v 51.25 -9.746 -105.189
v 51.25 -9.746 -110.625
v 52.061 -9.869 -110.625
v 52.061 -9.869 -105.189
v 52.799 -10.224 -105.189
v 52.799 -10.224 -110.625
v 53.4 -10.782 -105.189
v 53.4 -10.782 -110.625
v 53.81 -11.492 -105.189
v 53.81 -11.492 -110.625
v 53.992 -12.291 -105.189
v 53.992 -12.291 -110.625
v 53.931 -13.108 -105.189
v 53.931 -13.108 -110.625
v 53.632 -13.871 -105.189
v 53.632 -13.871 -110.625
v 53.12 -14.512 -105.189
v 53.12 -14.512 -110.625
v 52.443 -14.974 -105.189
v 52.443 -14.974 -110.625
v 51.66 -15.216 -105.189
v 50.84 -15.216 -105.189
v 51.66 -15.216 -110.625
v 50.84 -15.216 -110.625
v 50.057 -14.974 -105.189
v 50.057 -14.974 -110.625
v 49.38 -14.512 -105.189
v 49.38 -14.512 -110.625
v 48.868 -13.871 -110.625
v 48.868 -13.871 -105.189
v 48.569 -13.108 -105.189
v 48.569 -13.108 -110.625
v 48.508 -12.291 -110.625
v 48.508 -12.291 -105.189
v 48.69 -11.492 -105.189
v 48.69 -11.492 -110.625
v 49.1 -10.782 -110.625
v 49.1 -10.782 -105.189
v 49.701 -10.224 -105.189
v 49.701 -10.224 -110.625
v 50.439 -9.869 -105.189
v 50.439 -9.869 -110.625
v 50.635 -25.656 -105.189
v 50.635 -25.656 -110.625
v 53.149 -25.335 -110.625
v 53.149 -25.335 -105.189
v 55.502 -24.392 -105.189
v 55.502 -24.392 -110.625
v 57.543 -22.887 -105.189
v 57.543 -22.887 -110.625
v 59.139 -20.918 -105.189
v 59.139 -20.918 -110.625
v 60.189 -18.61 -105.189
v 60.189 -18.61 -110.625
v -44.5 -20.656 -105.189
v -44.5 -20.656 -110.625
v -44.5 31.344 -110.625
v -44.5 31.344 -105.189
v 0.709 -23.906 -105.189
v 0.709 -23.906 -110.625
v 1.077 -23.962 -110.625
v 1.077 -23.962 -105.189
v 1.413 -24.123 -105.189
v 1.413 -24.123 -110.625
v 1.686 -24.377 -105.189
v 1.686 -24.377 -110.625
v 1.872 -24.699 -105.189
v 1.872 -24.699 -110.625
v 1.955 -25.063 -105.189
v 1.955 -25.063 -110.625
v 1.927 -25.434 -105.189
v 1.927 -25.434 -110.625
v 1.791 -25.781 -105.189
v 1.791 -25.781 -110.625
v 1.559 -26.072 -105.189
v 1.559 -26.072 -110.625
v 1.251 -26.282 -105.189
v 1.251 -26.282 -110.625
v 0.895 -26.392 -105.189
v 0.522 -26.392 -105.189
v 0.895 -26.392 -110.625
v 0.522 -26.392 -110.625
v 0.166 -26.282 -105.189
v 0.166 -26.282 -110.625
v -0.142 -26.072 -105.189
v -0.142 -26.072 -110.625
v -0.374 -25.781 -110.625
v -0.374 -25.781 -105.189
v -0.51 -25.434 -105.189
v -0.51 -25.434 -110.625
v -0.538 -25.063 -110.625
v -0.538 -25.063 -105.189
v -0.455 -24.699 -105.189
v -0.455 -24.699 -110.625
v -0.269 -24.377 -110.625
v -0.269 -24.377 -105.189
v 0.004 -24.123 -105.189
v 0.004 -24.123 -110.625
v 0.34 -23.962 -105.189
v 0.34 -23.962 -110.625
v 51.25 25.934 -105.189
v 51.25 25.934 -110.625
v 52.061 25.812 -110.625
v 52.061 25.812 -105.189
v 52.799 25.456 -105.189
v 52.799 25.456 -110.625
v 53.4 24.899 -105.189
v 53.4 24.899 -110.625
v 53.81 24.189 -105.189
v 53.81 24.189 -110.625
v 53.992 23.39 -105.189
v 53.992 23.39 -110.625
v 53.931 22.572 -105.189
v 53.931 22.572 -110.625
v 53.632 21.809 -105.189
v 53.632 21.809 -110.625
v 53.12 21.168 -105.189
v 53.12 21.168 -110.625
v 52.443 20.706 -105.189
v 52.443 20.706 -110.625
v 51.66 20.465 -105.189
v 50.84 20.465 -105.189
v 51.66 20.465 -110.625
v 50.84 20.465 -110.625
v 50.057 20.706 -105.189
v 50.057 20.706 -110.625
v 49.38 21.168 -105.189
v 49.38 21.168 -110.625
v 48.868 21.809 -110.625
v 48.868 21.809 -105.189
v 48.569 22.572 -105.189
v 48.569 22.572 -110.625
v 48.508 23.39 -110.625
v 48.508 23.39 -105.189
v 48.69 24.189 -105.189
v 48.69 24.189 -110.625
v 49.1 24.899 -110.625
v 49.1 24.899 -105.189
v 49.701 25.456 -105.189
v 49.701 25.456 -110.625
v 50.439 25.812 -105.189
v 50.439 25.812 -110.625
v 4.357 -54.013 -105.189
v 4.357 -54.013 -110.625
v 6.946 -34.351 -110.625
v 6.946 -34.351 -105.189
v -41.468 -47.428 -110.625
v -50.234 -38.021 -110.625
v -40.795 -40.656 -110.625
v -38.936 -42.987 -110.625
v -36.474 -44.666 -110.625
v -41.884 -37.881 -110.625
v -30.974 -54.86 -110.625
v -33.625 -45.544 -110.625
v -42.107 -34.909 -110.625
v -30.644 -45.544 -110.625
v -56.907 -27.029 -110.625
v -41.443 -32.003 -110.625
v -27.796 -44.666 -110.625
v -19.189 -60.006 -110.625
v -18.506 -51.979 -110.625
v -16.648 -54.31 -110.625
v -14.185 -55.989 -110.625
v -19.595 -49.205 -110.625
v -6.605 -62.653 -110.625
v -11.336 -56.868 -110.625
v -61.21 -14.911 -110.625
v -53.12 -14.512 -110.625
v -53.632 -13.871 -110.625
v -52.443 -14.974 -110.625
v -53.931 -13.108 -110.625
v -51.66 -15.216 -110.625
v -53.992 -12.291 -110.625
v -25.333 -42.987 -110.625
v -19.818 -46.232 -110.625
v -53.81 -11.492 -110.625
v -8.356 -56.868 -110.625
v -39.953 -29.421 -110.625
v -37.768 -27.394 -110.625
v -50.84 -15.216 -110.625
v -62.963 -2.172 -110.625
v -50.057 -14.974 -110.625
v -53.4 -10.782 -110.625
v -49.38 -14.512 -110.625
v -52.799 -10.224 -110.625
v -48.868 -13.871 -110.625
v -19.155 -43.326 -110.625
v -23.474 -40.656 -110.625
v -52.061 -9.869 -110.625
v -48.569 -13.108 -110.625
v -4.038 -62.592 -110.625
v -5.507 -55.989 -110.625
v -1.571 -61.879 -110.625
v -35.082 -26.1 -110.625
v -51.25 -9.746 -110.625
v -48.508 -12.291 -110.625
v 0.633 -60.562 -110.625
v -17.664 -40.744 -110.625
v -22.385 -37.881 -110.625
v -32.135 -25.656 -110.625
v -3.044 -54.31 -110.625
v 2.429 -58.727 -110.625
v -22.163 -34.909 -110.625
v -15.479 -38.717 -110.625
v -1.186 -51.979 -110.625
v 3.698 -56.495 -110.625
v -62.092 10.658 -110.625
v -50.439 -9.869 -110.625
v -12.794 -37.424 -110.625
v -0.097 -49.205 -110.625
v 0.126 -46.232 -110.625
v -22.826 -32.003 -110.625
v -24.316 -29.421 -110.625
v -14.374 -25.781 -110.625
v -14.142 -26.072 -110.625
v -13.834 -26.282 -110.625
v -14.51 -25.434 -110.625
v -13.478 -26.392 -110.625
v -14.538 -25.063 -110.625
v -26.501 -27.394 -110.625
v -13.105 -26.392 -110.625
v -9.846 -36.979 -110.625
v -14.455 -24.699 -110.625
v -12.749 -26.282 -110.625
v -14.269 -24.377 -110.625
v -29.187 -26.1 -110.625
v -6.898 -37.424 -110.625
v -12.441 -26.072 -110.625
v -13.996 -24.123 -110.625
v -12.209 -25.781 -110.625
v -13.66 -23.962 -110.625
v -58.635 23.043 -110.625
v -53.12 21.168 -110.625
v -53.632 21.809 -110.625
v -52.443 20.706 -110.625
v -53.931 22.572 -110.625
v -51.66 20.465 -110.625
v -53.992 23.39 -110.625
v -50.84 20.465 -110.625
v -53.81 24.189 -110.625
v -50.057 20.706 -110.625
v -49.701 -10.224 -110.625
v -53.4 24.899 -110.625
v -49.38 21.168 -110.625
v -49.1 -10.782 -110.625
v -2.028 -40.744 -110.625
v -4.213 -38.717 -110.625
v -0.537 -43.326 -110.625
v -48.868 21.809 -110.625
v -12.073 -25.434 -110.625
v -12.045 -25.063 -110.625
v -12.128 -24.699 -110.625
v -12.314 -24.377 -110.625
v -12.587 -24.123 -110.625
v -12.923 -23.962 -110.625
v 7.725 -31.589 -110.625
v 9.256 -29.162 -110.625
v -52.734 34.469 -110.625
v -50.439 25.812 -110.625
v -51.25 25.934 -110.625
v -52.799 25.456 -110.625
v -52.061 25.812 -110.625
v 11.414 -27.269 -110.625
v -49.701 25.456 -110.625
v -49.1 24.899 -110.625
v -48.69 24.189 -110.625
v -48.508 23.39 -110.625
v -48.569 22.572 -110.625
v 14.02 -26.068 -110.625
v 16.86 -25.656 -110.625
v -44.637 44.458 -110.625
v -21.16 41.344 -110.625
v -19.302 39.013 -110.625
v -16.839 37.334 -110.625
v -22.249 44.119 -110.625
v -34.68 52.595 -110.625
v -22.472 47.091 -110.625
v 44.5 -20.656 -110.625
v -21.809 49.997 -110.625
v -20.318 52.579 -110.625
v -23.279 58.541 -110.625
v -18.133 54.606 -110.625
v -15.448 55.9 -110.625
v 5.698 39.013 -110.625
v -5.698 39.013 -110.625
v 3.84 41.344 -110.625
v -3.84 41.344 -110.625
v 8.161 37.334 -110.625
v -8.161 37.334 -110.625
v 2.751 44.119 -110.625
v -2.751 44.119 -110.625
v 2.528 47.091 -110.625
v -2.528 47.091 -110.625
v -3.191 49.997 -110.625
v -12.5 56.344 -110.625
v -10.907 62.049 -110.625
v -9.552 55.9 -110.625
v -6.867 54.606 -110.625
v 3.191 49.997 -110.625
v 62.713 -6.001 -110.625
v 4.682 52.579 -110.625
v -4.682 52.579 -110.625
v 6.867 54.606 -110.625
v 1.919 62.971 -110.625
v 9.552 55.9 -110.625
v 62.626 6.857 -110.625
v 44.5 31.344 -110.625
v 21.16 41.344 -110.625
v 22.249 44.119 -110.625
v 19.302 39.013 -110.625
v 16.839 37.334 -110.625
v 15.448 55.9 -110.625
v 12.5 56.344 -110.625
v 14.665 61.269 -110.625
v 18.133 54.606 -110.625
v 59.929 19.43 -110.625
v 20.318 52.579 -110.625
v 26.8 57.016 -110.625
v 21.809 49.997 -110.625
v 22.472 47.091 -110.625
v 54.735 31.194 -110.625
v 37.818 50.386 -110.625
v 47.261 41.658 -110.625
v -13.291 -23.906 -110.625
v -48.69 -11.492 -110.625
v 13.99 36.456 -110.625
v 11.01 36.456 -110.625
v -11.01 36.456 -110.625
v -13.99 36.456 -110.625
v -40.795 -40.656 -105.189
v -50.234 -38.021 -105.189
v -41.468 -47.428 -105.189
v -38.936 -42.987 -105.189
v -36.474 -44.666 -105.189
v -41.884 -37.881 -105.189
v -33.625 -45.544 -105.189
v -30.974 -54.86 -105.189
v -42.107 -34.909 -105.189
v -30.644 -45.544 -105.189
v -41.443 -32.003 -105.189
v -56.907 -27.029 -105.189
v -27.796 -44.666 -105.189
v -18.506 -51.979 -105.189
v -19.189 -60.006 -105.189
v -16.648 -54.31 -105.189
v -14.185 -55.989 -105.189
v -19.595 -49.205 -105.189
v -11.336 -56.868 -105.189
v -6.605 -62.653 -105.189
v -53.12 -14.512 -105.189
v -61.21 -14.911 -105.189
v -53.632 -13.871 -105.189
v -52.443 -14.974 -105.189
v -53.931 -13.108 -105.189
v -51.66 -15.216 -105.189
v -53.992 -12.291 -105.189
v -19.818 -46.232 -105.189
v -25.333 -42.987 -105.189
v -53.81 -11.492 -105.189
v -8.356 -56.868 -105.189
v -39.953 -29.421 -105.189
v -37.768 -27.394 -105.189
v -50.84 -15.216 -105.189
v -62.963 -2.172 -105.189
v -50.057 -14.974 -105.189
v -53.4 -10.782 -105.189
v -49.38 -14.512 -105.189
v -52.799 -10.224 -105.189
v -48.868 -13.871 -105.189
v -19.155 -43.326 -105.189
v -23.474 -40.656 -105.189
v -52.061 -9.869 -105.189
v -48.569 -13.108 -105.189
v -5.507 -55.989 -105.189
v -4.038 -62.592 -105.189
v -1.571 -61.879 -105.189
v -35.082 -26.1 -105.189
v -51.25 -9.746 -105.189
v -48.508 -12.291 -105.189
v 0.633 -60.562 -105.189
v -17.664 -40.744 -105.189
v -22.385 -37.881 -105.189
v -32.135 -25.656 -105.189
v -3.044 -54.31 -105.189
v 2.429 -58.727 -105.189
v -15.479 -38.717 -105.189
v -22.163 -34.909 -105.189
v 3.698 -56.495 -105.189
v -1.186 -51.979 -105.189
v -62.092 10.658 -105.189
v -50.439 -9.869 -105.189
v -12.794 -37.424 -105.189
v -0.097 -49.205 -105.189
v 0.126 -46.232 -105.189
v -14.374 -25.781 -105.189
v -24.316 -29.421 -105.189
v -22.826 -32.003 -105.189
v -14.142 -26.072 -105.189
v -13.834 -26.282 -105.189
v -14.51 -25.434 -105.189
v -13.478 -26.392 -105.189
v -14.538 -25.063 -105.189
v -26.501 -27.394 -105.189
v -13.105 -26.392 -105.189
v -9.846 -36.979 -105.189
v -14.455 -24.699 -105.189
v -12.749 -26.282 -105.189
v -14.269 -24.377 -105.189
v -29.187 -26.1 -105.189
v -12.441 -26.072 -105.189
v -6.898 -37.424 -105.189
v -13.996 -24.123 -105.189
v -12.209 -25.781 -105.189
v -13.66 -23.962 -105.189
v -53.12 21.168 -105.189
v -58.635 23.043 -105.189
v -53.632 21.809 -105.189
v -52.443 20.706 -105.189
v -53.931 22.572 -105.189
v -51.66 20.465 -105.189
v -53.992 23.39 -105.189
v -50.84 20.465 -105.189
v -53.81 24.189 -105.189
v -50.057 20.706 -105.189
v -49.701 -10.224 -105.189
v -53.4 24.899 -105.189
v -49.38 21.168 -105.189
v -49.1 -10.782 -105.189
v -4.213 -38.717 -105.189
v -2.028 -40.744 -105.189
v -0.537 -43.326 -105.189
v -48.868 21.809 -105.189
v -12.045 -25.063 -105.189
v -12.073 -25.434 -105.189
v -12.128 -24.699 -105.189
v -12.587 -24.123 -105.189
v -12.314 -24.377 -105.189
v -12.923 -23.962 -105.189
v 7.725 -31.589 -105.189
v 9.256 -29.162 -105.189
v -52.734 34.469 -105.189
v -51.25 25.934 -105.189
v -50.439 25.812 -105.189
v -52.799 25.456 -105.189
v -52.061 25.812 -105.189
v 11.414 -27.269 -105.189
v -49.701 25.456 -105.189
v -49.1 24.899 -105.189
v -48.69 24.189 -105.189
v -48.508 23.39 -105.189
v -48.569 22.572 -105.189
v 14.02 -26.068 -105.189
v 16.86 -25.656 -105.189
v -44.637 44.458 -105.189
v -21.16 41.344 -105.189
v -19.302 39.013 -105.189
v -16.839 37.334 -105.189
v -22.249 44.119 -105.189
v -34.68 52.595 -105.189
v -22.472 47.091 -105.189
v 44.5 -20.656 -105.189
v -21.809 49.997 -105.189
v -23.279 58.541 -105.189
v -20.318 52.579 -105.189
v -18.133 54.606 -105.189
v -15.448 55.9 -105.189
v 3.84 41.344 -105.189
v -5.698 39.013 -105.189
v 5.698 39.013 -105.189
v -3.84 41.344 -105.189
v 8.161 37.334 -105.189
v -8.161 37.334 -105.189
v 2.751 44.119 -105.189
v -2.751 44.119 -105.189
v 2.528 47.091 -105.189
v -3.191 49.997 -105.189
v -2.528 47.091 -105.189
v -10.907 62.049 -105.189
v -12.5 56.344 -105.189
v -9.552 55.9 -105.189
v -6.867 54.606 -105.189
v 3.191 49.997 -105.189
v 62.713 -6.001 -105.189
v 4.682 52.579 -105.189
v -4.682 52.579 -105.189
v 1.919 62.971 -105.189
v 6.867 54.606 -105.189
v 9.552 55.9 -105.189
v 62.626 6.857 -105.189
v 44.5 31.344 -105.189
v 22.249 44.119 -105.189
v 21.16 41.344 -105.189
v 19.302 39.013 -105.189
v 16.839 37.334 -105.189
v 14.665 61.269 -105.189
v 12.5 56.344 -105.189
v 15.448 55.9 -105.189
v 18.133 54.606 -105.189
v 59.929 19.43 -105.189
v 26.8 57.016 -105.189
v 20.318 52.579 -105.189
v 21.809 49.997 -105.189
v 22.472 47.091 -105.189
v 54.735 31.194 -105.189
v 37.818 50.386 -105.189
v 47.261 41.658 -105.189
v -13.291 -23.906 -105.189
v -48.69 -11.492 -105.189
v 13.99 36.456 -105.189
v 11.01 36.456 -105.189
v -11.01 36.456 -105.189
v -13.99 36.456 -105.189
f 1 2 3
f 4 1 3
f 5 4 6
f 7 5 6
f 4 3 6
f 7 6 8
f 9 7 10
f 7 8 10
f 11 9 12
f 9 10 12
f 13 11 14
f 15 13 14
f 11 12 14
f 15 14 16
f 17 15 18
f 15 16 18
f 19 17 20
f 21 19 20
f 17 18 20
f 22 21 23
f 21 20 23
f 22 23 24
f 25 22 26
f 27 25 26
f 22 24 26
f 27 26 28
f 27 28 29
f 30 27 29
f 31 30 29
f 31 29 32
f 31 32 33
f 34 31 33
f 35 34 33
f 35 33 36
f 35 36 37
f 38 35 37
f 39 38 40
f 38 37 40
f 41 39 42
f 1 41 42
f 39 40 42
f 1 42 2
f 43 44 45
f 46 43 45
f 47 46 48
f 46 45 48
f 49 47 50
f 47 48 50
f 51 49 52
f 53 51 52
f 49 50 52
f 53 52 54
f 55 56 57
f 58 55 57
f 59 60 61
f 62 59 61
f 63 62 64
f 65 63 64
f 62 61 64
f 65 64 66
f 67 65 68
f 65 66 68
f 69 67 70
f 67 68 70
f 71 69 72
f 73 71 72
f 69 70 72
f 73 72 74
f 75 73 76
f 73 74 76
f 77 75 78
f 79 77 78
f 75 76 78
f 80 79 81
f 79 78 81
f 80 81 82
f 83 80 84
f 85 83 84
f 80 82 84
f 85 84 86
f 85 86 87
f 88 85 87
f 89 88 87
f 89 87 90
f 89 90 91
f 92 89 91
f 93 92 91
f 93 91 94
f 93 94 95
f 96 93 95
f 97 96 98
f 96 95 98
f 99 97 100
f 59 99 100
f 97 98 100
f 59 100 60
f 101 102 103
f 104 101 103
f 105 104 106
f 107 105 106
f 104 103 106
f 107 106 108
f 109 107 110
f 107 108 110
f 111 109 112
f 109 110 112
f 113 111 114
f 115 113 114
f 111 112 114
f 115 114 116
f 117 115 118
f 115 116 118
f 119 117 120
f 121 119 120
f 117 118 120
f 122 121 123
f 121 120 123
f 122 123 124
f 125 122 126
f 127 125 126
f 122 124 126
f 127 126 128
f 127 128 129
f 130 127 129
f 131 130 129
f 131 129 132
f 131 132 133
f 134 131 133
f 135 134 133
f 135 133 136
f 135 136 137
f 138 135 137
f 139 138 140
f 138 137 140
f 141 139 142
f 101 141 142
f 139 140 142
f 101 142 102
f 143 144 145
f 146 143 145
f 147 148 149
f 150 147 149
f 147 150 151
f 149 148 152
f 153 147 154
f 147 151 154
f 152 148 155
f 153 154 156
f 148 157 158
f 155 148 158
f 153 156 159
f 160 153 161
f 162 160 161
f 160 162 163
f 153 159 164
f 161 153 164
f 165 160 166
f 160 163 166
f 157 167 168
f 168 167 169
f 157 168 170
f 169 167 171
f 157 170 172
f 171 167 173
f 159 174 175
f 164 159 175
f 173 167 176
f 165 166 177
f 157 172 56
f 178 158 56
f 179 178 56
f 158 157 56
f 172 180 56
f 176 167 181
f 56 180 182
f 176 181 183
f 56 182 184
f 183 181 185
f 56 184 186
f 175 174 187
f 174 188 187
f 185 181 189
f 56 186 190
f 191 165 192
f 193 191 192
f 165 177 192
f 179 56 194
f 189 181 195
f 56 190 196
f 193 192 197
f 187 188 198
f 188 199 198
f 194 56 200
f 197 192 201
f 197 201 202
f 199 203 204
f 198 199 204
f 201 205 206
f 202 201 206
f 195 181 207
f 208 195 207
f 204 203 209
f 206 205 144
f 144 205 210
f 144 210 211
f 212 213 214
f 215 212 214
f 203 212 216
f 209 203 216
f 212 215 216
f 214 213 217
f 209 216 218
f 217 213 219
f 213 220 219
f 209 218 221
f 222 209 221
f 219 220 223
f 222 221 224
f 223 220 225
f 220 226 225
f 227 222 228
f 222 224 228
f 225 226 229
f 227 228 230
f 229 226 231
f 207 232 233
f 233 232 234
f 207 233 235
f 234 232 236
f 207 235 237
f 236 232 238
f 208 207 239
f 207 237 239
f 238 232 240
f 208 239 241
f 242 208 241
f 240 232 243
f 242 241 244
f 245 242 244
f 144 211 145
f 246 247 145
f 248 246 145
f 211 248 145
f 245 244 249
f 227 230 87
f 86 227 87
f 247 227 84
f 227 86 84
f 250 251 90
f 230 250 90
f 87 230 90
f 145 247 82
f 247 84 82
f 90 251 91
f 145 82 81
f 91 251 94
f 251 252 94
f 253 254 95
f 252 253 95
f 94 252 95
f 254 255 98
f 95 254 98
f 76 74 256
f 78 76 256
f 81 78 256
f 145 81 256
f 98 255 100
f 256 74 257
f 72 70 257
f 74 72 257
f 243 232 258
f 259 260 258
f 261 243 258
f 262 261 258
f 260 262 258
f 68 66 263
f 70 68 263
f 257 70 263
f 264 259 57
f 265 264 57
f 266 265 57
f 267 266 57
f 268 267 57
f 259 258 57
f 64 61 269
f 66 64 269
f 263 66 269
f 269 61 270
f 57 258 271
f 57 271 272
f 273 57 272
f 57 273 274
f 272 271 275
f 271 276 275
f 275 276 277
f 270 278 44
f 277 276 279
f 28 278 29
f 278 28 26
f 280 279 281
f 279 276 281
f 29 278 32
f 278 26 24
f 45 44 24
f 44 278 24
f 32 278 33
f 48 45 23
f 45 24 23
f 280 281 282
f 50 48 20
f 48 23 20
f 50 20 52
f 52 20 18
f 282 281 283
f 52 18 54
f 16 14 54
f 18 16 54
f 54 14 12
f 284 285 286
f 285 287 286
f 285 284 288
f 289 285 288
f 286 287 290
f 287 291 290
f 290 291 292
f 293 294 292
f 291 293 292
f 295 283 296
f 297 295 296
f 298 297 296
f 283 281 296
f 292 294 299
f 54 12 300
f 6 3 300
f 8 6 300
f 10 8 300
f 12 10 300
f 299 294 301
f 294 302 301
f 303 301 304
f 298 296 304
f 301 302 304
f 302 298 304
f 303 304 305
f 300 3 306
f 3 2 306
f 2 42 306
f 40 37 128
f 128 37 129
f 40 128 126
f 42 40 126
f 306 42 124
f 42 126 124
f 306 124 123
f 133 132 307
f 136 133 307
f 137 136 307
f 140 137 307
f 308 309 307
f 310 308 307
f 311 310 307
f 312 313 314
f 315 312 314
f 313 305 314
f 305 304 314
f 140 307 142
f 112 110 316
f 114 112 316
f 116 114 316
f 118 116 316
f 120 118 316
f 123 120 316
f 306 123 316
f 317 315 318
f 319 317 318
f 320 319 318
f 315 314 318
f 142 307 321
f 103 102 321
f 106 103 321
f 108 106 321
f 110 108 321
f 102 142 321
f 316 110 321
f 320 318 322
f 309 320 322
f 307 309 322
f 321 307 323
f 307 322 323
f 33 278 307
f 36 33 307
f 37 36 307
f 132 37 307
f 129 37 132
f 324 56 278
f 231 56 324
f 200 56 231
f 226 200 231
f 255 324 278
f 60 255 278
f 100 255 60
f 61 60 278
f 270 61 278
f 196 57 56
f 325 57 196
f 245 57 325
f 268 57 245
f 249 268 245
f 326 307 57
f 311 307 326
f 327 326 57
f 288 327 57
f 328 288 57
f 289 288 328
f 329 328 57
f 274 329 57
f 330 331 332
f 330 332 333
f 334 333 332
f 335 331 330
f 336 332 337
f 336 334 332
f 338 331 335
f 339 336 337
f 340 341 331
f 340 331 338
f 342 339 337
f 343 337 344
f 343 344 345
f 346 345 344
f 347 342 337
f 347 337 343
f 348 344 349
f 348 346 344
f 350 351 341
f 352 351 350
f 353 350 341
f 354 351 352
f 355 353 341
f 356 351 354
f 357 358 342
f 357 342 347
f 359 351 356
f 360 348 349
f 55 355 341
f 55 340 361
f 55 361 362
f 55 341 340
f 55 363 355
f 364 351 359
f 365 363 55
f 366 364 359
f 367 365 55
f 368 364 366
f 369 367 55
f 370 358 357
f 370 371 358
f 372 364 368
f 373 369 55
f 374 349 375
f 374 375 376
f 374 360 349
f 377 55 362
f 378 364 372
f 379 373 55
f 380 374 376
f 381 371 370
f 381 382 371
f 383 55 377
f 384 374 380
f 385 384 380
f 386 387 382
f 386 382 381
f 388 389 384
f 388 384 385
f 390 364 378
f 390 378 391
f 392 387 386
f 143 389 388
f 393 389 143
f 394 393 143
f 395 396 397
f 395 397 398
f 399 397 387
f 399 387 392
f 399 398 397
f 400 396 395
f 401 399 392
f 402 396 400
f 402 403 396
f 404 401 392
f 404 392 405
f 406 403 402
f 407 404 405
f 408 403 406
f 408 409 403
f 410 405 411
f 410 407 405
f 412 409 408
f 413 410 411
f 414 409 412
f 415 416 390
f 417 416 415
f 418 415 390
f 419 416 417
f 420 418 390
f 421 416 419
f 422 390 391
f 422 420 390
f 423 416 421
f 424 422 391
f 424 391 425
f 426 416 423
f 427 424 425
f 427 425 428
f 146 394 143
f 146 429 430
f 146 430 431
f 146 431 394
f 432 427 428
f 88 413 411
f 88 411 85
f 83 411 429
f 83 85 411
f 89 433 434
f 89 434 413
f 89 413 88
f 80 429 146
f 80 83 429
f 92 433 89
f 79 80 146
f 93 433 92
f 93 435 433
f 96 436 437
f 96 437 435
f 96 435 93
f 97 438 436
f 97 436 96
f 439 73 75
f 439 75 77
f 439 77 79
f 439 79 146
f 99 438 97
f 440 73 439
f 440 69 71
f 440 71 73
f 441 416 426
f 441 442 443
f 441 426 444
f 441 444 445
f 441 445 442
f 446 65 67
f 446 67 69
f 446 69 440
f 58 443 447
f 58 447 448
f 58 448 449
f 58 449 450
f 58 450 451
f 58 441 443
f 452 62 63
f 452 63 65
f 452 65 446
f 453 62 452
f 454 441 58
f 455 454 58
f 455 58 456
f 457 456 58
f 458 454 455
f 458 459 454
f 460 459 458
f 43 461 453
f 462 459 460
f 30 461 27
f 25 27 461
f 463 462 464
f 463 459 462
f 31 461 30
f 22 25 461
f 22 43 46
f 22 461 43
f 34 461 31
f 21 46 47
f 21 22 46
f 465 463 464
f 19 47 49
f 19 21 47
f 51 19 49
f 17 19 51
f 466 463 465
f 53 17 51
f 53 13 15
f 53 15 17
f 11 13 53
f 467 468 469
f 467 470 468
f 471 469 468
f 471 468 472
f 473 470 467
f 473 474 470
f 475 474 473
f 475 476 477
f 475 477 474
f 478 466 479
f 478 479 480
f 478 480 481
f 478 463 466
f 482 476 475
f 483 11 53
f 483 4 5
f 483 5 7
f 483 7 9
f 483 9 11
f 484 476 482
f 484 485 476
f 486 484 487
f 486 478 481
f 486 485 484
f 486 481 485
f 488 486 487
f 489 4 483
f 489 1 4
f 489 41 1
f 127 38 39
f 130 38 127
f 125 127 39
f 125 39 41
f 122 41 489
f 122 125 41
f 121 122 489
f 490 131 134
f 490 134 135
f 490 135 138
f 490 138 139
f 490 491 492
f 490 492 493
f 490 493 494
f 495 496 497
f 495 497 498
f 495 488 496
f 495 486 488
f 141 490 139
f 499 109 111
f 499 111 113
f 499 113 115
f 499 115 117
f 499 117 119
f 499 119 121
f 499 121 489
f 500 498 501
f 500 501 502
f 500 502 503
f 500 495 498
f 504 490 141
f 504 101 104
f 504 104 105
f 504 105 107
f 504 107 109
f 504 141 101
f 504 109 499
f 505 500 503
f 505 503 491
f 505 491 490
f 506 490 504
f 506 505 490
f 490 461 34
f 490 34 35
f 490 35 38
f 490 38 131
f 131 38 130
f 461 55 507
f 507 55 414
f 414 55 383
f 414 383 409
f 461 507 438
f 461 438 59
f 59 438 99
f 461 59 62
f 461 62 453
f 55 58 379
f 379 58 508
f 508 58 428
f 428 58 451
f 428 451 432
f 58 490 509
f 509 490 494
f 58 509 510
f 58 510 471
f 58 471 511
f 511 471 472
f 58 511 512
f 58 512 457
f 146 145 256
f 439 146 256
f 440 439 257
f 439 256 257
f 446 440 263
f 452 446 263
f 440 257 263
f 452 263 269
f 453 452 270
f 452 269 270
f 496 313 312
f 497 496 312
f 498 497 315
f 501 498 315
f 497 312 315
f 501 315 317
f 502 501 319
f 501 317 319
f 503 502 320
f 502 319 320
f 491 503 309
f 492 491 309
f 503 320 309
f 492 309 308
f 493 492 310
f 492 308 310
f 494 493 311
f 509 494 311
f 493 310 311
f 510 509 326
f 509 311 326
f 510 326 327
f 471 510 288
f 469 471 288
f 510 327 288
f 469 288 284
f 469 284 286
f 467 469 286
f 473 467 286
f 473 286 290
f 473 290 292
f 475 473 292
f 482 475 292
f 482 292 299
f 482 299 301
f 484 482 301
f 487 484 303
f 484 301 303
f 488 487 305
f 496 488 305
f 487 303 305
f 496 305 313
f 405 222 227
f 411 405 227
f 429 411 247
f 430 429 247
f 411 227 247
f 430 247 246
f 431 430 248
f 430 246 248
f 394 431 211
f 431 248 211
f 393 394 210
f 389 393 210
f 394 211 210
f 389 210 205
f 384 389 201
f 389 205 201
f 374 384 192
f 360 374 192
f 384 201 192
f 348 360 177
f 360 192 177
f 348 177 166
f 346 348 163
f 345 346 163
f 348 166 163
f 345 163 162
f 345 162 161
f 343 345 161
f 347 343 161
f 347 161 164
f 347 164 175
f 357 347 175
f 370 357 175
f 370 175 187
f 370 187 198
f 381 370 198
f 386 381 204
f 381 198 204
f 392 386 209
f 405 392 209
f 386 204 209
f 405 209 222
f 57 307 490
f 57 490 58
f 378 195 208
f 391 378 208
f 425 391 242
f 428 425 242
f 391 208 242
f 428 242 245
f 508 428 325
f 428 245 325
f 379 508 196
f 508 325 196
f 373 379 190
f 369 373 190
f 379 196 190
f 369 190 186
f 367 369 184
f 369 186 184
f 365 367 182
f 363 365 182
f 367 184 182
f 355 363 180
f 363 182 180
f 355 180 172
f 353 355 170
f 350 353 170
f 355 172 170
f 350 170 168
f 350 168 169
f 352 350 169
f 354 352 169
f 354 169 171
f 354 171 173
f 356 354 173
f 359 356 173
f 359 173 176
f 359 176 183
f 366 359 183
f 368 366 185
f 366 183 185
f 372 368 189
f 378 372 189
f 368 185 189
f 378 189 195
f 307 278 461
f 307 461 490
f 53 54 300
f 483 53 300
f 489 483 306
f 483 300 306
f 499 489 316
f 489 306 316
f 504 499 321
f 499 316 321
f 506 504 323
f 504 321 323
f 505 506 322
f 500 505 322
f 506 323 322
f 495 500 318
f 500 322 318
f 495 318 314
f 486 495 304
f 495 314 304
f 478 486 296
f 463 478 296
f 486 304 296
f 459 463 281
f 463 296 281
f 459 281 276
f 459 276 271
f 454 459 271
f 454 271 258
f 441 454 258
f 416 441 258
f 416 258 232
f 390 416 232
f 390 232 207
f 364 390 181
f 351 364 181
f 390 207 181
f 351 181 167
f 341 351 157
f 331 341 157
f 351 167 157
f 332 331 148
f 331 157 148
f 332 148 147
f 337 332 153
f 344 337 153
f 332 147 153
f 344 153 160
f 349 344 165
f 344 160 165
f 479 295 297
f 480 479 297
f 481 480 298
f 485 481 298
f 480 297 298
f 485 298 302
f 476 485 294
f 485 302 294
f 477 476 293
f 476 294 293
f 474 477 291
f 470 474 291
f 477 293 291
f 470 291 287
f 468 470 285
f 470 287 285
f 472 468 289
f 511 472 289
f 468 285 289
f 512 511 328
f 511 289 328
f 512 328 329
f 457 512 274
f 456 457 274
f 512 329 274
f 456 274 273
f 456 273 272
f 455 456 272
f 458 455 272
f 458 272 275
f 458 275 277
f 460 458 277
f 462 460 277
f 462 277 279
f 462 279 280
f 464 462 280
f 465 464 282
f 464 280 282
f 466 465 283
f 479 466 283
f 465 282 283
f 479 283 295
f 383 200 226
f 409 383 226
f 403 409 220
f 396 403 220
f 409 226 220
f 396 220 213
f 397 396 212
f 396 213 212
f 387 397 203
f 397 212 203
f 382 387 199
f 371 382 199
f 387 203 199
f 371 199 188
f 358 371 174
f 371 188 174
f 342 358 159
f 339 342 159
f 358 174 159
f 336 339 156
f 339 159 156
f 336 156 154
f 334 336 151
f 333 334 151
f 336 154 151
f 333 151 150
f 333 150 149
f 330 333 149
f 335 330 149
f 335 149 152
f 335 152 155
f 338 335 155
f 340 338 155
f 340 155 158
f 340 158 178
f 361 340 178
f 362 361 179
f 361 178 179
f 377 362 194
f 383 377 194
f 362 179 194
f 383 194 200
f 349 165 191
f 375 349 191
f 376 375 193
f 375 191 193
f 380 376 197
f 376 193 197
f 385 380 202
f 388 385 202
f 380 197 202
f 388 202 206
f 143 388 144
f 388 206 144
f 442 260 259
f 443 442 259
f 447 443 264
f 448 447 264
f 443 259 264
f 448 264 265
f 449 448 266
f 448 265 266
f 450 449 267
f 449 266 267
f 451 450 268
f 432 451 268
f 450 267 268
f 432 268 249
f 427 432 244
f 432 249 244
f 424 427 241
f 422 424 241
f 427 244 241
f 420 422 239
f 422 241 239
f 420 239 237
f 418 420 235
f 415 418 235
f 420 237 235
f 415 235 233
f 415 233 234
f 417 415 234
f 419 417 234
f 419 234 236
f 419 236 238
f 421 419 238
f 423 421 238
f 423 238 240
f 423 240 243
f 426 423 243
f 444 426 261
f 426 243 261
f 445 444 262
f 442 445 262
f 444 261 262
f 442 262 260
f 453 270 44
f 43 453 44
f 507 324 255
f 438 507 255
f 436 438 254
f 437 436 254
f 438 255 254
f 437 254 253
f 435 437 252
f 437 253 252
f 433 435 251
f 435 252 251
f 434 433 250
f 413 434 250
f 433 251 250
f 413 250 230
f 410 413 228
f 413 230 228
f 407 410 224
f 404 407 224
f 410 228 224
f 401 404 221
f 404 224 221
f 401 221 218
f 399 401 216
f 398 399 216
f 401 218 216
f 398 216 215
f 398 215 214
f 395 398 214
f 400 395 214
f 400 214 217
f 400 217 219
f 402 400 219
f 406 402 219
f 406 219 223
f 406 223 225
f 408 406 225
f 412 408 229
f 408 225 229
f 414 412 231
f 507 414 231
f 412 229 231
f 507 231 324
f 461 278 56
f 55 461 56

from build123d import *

# Parameters (mm, degrees)
SKETCH2_R           = 10
SKETCH2_R_2         = 2.75
SKETCH2_R_3         = 1.25
SKETCH2_W           = 89
SKETCH2_H           = 52
BOSS_EXTRUDE1_DEPTH = 5.4356


with BuildPart() as part:
    # Sketch2 → Boss-Extrude1 (new body)
    with BuildSketch(Plane(origin=(0, 0, -110.625), x_dir=(-1, 0, 0), z_dir=(0, 0, -1))):
        with BuildLine():
            Line((-4.357448371, -54.013133709), (-6.946028661, -34.350914325))
            ThreePointArc((-6.946028661, -34.350914325), (-10.267019124, -28.137778173), (-16.860477275, -25.656176248))
            Line((-16.860477275, -25.656176248), (-50.634811595, -25.656176248))
            ThreePointArc((-50.634811595, -25.656176248), (-56.570299984, -23.704155969), (-60.188549632, -18.610171766))
            ThreePointArc((-60.188549632, -18.610171766), (34.680301225, 52.595405759), (6.605490855, -62.652753256))
            ThreePointArc((6.605490855, -62.652753256), (-0.632673359, -60.562038878), (-4.357448371, -54.013133709))
        make_face()
        with Locations(Location((12.5, 46.343823752, 0), (0, 0, 90))):
            Circle(SKETCH2_R, mode=Mode.SUBTRACT)
        with Locations(Location((-12.5, 46.343823752, 0), (0, 0, 90))):
            Circle(SKETCH2_R, mode=Mode.SUBTRACT)
        with Locations(Location((32.134671235, -35.656176248, 0), (0, 0, 90))):
            Circle(SKETCH2_R, mode=Mode.SUBTRACT)
        with Locations(Location((9.845967479, -46.979324435, 0), (0, 0, 90))):
            Circle(SKETCH2_R, mode=Mode.SUBTRACT)
        with Locations(Location((51.25, 23.184046239, 0), (0, 0, 90))):
            Circle(SKETCH2_R_2, mode=Mode.SUBTRACT)
        with Locations(Location((51.25, -12.496398734, 0), (0, 0, 90))):
            Circle(SKETCH2_R_2, mode=Mode.SUBTRACT)
        with Locations(Location((-51.25, -12.496398734, 0), (0, 0, 90))):
            Circle(SKETCH2_R_2, mode=Mode.SUBTRACT)
        with Locations(Location((-51.25, 23.184046239, 0), (0, 0, 90))):
            Circle(SKETCH2_R_2, mode=Mode.SUBTRACT)
        with Locations(Location((13.291416771, -25.156176248, 0), (0, 0, 90))):
            Circle(SKETCH2_R_3, mode=Mode.SUBTRACT)
        with Locations(Location((-0.708583229, -25.156176248, 0), (0, 0, 90))):
            Circle(SKETCH2_R_3, mode=Mode.SUBTRACT)
        with Locations((0, 5.343823752)):
            Rectangle(SKETCH2_W, SKETCH2_H, mode=Mode.SUBTRACT)
    extrude(amount=-BOSS_EXTRUDE1_DEPTH)


solid = part.part
